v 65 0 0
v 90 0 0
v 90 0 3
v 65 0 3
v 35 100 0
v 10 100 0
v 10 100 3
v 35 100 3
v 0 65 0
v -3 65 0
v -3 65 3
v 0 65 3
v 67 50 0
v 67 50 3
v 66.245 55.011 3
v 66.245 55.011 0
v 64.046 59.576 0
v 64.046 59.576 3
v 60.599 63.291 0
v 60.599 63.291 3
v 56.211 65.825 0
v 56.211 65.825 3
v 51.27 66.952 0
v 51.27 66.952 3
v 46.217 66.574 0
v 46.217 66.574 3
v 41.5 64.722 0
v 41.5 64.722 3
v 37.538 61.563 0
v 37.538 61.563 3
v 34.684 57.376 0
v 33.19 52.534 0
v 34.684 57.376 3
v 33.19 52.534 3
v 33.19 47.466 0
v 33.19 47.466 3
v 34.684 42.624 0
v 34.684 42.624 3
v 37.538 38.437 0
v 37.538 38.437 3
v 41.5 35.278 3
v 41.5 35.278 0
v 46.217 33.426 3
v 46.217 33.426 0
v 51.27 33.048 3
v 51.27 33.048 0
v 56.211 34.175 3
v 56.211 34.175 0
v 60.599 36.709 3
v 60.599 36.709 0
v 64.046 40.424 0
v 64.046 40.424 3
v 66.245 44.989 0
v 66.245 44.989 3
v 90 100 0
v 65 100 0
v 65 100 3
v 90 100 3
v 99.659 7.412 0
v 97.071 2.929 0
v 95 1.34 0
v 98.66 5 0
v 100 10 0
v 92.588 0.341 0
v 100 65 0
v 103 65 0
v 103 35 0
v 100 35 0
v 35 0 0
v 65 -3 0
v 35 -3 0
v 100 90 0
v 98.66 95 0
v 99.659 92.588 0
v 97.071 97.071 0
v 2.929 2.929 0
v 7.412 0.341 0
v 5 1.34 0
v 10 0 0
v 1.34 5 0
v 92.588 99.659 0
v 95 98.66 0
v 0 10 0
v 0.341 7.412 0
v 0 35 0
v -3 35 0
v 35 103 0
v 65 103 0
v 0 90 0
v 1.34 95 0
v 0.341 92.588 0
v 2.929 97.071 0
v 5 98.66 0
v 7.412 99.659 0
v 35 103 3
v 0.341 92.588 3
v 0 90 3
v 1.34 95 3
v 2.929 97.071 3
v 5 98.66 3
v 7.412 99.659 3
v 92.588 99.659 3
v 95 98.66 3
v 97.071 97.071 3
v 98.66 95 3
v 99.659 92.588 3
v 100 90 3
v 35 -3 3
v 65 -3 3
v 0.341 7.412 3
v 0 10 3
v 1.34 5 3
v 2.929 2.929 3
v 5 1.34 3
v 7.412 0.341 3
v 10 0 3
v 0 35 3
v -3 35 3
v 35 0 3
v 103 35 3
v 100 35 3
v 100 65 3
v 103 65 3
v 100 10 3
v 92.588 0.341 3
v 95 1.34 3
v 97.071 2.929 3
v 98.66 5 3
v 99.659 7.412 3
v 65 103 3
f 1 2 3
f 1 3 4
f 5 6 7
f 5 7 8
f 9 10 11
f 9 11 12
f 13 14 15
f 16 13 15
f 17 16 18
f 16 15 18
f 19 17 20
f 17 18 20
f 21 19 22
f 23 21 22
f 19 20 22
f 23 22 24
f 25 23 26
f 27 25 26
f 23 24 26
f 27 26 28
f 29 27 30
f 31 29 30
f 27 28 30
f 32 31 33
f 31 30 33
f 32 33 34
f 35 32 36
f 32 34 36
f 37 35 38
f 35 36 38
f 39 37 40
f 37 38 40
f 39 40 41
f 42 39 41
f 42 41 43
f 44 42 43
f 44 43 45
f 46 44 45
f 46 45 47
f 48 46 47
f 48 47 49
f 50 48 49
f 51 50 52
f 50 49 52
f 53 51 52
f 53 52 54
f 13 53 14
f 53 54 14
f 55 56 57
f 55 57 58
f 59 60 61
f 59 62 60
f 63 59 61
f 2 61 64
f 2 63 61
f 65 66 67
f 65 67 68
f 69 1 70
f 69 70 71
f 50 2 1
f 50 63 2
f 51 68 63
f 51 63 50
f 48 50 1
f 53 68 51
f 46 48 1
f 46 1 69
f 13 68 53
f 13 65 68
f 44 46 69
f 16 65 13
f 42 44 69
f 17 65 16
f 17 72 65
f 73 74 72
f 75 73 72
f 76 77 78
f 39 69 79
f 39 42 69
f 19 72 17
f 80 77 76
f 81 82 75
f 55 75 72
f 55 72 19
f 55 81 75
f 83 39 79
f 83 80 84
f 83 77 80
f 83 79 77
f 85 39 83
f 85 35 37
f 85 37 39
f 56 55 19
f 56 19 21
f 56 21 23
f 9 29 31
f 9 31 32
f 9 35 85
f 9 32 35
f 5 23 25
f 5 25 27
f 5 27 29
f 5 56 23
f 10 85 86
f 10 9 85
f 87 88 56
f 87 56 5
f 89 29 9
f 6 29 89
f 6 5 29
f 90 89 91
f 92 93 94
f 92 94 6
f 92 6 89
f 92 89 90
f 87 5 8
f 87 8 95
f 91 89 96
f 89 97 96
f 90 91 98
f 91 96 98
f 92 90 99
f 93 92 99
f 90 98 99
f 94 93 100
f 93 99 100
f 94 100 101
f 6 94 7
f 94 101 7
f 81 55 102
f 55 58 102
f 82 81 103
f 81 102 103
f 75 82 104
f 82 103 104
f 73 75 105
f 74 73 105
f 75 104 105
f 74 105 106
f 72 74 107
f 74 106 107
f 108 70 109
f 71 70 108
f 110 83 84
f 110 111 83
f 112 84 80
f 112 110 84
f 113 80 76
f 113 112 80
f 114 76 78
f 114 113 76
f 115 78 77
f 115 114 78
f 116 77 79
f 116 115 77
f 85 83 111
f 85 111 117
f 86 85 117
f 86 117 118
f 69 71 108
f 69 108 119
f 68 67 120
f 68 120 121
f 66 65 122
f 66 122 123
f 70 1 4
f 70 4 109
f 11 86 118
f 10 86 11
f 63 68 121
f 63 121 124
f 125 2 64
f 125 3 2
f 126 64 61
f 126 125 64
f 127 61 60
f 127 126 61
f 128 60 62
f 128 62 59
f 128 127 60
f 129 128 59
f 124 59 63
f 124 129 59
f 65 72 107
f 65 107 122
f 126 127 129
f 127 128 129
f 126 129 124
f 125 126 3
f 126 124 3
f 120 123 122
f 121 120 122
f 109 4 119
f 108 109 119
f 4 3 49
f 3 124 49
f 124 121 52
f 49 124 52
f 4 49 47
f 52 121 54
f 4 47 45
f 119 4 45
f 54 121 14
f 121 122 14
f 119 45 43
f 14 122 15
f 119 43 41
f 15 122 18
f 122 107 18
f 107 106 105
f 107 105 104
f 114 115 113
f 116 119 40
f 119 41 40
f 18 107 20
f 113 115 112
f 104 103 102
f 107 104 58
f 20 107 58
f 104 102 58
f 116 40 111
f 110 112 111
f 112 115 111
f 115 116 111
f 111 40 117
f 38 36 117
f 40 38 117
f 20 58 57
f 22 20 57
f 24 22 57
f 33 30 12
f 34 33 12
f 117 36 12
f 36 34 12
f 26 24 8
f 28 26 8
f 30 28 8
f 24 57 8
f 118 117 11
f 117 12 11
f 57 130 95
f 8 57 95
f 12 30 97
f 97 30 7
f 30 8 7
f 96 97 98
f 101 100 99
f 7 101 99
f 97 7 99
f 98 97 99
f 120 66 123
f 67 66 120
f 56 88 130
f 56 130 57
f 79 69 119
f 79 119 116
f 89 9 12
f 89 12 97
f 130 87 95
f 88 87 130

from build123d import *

# Parameters (mm, degrees)
BOSS_EXTRU_1_DEPTH      = 3
ESQUISSE2_R             = 17
ENL_V_MAT_EXTRU_1_DEPTH = 3
CONG_1_R                = 10


with BuildPart() as part:
    # Esquisse1 → Boss.-Extru.1 (new body)
    with BuildSketch(Plane.XY):
        Polygon((0, 0), (0, 35), (-3, 35), (-3, 65), (0, 65), (0, 100), (35, 100), (35, 103), (65, 103), (65, 100), (100, 100), (100, 65), (103, 65), (103, 35), (100, 35), (100, 0), (65, 0), (65, -3), (35, -3), (35, 0), align=None)
    extrude(amount=BOSS_EXTRU_1_DEPTH)

    # Esquisse2 → Enlèv. mat.-Extru.1 (cut)
    with BuildSketch(Plane.XY.offset(3)):
        with Locations((50, 50)):
            Circle(ESQUISSE2_R)
    extrude(amount=-ENL_V_MAT_EXTRU_1_DEPTH, mode=Mode.SUBTRACT)

    # Congé1
    cong_1_edges = [part.edges().sort_by_distance(p)[0] for p in [
        (0, 0, 1.5),
        (0, 100, 1.5),
        (100, 100, 1.5),
        (100, 0, 1.5),
    ]]
    fillet(cong_1_edges, radius=CONG_1_R)


solid = part.part
